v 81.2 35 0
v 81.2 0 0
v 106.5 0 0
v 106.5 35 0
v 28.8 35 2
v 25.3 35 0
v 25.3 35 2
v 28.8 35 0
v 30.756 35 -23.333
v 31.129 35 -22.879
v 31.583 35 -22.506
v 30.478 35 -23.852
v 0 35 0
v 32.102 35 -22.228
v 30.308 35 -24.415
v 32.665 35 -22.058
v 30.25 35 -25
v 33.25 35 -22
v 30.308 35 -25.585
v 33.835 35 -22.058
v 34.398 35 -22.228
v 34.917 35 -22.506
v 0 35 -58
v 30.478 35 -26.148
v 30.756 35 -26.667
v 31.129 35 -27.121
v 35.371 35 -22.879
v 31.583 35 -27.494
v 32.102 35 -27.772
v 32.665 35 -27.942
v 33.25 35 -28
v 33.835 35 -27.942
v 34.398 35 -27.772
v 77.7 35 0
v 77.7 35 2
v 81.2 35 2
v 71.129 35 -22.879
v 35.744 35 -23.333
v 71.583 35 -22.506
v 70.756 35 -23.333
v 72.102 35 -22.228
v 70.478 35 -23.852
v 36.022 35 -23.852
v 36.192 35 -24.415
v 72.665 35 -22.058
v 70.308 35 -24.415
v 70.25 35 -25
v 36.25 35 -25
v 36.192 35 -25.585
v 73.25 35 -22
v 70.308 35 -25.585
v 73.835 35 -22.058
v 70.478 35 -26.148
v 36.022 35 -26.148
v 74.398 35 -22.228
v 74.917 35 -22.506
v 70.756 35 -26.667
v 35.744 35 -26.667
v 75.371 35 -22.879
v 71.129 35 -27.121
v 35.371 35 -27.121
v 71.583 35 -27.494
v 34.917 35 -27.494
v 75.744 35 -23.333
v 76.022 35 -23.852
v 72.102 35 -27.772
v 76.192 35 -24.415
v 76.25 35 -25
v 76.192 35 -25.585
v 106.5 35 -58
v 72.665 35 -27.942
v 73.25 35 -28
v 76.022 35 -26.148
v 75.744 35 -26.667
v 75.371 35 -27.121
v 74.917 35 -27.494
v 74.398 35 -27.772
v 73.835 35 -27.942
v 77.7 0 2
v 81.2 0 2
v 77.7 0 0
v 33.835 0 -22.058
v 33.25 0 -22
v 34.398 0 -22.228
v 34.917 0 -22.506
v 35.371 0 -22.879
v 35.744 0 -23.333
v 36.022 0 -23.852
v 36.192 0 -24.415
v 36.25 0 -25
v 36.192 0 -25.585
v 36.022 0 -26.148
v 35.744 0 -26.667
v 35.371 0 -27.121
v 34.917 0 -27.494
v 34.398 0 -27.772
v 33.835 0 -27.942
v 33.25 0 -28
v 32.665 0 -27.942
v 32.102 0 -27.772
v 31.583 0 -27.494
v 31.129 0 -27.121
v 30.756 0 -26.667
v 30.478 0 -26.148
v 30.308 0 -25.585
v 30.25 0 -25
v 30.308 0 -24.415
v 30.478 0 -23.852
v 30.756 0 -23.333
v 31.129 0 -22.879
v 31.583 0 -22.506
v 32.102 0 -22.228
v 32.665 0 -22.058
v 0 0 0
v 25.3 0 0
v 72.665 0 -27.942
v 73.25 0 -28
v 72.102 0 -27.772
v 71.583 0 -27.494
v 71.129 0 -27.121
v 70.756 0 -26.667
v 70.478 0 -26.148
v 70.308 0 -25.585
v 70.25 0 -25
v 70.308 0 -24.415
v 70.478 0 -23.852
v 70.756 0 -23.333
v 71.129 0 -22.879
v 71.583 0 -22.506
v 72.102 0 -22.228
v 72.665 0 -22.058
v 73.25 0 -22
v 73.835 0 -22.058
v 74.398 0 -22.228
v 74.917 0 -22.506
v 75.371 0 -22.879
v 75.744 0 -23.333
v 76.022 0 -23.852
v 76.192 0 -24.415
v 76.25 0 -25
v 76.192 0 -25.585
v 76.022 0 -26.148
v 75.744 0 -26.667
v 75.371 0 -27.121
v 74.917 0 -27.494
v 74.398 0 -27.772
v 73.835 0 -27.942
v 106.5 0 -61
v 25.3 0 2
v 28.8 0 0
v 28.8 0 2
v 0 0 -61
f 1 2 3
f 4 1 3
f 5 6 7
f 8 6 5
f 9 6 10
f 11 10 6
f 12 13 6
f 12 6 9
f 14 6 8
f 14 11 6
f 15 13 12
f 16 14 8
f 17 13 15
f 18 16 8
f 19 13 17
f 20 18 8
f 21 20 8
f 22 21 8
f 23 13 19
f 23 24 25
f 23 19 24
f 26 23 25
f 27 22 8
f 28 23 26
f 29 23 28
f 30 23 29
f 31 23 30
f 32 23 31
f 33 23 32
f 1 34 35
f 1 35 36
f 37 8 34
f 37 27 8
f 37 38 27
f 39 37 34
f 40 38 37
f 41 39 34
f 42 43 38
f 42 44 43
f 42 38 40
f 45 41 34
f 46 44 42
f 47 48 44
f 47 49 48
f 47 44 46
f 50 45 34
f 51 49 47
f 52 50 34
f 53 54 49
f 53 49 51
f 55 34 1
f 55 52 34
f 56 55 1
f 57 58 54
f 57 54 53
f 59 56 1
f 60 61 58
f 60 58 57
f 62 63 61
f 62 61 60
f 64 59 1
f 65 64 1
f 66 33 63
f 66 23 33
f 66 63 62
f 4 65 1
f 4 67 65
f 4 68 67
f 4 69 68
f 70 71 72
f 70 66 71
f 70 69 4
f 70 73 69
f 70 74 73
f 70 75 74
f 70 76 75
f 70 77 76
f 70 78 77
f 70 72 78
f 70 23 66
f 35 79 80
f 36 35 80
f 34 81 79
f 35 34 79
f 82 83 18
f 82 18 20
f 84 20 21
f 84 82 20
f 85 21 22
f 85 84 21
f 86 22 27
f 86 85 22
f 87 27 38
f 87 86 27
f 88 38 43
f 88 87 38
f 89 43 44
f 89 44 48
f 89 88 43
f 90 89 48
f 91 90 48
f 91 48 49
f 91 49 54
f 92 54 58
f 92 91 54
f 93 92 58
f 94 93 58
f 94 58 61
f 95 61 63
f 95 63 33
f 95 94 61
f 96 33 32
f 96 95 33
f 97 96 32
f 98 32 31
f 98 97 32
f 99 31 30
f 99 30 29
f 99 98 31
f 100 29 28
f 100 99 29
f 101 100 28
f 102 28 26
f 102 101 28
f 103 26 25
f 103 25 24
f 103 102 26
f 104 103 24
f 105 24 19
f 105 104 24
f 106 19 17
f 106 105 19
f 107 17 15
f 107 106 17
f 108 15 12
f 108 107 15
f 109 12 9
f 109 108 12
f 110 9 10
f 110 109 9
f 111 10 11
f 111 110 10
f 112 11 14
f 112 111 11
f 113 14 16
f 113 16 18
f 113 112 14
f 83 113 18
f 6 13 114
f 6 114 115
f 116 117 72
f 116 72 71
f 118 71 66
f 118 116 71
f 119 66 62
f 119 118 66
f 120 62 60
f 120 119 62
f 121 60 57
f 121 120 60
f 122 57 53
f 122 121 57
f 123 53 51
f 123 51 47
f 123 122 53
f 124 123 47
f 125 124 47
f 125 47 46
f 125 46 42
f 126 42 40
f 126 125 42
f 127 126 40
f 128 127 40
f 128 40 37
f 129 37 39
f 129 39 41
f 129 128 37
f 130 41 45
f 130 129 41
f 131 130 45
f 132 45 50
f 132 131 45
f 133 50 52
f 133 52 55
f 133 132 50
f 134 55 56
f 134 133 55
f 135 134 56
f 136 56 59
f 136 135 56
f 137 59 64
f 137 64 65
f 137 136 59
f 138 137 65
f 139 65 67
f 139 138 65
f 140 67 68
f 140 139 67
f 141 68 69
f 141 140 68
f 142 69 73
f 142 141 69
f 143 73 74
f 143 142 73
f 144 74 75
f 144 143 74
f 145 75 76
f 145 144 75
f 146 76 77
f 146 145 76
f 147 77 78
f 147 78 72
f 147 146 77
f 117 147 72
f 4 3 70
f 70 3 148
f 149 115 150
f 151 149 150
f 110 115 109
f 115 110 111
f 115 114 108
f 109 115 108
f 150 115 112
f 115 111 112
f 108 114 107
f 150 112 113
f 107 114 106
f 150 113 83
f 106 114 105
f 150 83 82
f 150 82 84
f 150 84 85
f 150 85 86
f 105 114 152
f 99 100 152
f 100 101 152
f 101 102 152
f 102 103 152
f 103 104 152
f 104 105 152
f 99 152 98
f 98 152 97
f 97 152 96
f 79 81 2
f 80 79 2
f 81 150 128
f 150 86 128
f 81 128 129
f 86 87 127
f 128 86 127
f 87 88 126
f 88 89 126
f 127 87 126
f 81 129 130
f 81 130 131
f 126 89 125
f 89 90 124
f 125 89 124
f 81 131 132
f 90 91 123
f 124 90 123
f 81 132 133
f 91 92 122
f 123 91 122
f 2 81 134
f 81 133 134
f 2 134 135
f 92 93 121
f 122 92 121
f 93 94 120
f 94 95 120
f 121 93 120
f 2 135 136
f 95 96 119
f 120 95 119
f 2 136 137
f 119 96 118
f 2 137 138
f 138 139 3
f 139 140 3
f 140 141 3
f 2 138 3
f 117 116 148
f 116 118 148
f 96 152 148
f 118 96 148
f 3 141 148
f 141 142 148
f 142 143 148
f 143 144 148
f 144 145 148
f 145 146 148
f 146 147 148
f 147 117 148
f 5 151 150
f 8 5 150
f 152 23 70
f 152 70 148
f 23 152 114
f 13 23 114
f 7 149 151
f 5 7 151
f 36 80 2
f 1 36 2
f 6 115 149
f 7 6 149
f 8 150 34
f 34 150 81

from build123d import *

# Parameters (mm, degrees)
SKETCH1_R               = 3
BOSS_EXTRUDE2_DEPTH     = 35
CUT_EXTRUDE1_DEPTH      = 128.625428501
CUT_EXTRUDE1_DEPTH_BACK = 128.625428501


with BuildPart() as part:
    # Sketch1 → Boss-Extrude2 (new body)
    with BuildSketch(Plane(origin=(0, 0, 0), x_dir=(1, 0, 0), z_dir=(0, 1, 0))):
        Polygon((0, 0), (25.3, 0), (25.3, -2), (28.8, -2), (28.8, 0), (77.7, 0), (77.7, -2), (81.2, -2), (81.2, 0), (106.5, 0), (106.5, 61), (0, 61), align=None)
        with Locations(Location((33.25, 25, 0), (0, 0, 270))):
            Circle(SKETCH1_R, mode=Mode.SUBTRACT)
        with Locations(Location((73.25, 25, 0), (0, 0, 90))):
            Circle(SKETCH1_R, mode=Mode.SUBTRACT)
    extrude(amount=BOSS_EXTRUDE2_DEPTH)

    # Sketch2 → Cut-Extrude1 (cut, two sides: drawn at the far end of the back side and taken through both)
    with BuildSketch(Plane.ZY.offset(-CUT_EXTRUDE1_DEPTH_BACK)):
        Polygon((-61, 35), (-58, 35), (-61, 0), align=None)
    extrude(amount=CUT_EXTRUDE1_DEPTH + CUT_EXTRUDE1_DEPTH_BACK, mode=Mode.SUBTRACT)


solid = part.part
